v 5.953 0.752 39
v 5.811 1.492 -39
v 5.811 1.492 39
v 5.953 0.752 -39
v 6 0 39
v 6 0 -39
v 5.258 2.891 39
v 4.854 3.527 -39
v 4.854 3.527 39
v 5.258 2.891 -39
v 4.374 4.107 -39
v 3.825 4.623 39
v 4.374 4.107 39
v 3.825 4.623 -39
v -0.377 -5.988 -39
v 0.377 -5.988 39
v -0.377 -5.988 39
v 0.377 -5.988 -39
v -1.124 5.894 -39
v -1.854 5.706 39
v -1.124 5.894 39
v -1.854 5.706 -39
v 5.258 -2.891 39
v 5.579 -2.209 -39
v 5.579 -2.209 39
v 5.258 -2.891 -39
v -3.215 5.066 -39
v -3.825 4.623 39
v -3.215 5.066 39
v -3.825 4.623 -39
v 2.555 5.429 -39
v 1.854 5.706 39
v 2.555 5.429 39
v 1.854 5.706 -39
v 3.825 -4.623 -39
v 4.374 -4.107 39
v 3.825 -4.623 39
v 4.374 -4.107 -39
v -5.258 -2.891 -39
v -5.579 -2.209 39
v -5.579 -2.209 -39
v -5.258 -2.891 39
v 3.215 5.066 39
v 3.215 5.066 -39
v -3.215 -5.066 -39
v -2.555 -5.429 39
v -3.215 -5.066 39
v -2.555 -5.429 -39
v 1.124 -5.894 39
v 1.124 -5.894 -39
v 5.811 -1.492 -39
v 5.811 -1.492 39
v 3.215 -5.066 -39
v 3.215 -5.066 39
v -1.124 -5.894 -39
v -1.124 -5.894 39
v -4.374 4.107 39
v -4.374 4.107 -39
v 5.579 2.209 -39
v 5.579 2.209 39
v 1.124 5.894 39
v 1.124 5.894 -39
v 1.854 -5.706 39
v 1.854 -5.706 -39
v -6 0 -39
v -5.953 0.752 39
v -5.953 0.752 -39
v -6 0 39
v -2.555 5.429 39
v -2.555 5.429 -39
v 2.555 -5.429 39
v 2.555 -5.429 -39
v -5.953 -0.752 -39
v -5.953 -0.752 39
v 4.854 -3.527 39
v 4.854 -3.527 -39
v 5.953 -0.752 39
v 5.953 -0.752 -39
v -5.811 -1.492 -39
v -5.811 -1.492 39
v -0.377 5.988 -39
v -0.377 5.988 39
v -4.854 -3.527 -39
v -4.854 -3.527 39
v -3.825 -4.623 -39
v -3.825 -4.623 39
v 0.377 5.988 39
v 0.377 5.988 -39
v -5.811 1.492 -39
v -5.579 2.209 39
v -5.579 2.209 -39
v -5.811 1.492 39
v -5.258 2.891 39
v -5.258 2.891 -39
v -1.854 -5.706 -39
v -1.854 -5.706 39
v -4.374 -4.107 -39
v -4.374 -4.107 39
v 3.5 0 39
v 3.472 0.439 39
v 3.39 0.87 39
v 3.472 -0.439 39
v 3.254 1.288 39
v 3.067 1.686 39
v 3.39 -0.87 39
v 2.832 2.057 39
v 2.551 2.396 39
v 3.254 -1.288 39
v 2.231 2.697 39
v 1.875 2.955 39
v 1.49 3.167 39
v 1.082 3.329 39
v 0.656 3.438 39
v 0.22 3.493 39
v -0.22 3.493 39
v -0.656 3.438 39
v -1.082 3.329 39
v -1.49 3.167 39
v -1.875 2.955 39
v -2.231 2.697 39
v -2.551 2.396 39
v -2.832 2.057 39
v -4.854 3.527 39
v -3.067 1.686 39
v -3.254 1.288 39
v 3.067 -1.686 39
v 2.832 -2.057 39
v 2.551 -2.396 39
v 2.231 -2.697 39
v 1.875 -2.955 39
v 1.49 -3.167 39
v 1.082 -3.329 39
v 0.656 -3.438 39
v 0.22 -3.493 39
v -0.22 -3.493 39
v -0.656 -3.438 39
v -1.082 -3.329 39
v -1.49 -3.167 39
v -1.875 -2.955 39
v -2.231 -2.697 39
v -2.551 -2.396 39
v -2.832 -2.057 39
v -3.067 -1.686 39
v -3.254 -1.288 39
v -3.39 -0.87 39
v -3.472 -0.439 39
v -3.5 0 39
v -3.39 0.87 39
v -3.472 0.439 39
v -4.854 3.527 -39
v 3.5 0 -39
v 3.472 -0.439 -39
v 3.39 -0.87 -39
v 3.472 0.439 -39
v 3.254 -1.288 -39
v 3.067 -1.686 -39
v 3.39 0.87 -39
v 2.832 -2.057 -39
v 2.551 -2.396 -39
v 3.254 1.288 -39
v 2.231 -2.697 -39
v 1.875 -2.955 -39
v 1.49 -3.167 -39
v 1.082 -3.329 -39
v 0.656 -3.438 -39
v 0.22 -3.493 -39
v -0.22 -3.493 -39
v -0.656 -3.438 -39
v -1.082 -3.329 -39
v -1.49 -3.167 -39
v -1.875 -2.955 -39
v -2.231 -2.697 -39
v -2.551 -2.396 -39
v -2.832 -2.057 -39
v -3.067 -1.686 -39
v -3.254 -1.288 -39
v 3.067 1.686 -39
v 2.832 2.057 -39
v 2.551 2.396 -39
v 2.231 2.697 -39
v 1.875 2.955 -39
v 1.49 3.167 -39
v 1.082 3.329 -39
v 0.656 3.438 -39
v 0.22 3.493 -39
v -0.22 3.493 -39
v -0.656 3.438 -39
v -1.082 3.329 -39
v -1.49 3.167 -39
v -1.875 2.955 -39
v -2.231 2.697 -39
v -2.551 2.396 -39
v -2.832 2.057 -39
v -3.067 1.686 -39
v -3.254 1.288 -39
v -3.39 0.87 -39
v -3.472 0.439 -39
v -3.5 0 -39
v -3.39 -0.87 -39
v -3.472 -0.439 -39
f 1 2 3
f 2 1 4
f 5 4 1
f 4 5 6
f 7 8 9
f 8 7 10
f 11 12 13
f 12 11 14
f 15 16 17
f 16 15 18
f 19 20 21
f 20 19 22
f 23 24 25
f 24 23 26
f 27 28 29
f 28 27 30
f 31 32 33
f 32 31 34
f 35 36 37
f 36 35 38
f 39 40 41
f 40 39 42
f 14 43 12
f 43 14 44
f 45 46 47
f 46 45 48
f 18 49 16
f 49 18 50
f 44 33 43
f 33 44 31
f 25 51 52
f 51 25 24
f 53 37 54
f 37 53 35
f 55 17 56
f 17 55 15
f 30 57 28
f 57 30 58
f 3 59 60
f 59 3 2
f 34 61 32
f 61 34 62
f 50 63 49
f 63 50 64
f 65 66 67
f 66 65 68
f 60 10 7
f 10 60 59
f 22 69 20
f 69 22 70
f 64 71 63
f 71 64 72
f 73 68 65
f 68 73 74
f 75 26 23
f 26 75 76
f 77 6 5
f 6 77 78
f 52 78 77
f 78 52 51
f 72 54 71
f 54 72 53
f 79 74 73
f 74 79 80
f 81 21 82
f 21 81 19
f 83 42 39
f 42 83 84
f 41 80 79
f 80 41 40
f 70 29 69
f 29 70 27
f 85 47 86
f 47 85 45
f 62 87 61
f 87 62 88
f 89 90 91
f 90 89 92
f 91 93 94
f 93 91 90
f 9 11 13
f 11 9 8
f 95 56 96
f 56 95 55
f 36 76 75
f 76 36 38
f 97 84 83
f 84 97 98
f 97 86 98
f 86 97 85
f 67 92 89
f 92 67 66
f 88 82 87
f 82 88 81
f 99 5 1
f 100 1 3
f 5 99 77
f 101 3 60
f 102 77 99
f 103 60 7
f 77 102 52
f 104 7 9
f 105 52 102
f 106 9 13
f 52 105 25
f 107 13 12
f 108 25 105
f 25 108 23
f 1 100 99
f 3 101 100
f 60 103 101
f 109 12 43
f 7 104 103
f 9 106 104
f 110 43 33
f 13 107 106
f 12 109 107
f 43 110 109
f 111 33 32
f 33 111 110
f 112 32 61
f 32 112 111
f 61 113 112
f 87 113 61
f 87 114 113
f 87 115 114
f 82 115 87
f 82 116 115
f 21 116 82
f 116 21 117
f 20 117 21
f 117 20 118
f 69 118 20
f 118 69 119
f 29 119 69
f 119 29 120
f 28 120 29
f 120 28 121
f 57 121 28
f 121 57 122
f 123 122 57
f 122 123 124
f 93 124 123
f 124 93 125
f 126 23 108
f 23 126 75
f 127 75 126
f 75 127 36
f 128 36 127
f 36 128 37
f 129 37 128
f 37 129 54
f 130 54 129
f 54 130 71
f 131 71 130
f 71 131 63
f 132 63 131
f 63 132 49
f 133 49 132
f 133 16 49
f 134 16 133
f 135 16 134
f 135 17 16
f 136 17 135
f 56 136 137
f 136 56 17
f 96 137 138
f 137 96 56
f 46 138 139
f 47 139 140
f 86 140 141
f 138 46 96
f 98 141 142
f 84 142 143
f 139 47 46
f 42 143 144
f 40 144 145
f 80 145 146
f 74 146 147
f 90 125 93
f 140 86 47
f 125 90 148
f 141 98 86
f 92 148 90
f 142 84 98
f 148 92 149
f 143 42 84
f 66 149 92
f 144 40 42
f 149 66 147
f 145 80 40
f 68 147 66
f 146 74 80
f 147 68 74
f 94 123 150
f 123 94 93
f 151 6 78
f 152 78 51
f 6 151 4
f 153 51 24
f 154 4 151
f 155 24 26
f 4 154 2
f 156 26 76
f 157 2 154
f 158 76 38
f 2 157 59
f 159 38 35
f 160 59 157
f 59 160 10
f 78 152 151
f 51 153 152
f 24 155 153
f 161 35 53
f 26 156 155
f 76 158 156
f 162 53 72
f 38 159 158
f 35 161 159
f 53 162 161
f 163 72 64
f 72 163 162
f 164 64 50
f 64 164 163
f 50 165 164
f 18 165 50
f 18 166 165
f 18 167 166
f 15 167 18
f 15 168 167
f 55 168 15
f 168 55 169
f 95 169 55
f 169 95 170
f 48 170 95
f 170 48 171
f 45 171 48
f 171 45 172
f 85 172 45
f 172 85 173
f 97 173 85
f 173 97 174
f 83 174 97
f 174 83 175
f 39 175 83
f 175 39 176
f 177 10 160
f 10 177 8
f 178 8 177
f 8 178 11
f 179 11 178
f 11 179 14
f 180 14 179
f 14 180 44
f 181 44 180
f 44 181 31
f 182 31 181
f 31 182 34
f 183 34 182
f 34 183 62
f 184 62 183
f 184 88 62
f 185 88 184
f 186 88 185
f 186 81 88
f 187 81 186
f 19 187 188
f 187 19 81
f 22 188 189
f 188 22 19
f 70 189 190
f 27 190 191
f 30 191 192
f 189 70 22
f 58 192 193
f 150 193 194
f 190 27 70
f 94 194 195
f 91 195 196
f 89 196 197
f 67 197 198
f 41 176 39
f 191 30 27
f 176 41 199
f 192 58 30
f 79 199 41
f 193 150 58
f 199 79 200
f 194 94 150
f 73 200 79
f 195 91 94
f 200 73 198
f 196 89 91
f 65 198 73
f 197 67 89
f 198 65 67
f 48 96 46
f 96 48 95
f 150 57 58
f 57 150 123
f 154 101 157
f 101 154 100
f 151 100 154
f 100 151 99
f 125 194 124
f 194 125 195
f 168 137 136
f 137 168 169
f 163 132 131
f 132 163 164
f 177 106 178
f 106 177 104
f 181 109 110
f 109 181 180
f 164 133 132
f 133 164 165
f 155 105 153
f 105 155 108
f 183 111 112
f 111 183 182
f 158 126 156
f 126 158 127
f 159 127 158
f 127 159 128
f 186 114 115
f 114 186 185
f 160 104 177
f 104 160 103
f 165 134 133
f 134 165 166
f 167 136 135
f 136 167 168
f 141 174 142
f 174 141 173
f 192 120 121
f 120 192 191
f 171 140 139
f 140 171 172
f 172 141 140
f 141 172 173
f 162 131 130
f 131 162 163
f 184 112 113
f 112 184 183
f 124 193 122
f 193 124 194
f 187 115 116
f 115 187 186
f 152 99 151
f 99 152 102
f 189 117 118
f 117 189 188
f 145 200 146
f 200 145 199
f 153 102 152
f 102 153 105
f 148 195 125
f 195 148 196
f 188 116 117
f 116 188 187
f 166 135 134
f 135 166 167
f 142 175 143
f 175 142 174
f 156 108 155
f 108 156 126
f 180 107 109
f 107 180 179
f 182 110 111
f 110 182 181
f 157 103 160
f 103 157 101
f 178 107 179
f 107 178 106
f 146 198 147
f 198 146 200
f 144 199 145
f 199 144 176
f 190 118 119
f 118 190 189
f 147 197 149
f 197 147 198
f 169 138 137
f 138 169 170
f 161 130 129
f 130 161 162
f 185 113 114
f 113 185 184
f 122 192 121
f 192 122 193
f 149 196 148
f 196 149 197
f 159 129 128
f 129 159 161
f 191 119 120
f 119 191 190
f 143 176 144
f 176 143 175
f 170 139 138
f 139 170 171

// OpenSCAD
$fn = 50;


difference() {
	union() {
		translate(v = [0, 0, -39.0000000000]) {
			cylinder(h = 78, r = 6.0000000000);
		}
	}
	union() {
		translate(v = [0, 0, -100.0000000000]) {
			cylinder(h = 200, r = 3.5000000000);
		}
	}
}
